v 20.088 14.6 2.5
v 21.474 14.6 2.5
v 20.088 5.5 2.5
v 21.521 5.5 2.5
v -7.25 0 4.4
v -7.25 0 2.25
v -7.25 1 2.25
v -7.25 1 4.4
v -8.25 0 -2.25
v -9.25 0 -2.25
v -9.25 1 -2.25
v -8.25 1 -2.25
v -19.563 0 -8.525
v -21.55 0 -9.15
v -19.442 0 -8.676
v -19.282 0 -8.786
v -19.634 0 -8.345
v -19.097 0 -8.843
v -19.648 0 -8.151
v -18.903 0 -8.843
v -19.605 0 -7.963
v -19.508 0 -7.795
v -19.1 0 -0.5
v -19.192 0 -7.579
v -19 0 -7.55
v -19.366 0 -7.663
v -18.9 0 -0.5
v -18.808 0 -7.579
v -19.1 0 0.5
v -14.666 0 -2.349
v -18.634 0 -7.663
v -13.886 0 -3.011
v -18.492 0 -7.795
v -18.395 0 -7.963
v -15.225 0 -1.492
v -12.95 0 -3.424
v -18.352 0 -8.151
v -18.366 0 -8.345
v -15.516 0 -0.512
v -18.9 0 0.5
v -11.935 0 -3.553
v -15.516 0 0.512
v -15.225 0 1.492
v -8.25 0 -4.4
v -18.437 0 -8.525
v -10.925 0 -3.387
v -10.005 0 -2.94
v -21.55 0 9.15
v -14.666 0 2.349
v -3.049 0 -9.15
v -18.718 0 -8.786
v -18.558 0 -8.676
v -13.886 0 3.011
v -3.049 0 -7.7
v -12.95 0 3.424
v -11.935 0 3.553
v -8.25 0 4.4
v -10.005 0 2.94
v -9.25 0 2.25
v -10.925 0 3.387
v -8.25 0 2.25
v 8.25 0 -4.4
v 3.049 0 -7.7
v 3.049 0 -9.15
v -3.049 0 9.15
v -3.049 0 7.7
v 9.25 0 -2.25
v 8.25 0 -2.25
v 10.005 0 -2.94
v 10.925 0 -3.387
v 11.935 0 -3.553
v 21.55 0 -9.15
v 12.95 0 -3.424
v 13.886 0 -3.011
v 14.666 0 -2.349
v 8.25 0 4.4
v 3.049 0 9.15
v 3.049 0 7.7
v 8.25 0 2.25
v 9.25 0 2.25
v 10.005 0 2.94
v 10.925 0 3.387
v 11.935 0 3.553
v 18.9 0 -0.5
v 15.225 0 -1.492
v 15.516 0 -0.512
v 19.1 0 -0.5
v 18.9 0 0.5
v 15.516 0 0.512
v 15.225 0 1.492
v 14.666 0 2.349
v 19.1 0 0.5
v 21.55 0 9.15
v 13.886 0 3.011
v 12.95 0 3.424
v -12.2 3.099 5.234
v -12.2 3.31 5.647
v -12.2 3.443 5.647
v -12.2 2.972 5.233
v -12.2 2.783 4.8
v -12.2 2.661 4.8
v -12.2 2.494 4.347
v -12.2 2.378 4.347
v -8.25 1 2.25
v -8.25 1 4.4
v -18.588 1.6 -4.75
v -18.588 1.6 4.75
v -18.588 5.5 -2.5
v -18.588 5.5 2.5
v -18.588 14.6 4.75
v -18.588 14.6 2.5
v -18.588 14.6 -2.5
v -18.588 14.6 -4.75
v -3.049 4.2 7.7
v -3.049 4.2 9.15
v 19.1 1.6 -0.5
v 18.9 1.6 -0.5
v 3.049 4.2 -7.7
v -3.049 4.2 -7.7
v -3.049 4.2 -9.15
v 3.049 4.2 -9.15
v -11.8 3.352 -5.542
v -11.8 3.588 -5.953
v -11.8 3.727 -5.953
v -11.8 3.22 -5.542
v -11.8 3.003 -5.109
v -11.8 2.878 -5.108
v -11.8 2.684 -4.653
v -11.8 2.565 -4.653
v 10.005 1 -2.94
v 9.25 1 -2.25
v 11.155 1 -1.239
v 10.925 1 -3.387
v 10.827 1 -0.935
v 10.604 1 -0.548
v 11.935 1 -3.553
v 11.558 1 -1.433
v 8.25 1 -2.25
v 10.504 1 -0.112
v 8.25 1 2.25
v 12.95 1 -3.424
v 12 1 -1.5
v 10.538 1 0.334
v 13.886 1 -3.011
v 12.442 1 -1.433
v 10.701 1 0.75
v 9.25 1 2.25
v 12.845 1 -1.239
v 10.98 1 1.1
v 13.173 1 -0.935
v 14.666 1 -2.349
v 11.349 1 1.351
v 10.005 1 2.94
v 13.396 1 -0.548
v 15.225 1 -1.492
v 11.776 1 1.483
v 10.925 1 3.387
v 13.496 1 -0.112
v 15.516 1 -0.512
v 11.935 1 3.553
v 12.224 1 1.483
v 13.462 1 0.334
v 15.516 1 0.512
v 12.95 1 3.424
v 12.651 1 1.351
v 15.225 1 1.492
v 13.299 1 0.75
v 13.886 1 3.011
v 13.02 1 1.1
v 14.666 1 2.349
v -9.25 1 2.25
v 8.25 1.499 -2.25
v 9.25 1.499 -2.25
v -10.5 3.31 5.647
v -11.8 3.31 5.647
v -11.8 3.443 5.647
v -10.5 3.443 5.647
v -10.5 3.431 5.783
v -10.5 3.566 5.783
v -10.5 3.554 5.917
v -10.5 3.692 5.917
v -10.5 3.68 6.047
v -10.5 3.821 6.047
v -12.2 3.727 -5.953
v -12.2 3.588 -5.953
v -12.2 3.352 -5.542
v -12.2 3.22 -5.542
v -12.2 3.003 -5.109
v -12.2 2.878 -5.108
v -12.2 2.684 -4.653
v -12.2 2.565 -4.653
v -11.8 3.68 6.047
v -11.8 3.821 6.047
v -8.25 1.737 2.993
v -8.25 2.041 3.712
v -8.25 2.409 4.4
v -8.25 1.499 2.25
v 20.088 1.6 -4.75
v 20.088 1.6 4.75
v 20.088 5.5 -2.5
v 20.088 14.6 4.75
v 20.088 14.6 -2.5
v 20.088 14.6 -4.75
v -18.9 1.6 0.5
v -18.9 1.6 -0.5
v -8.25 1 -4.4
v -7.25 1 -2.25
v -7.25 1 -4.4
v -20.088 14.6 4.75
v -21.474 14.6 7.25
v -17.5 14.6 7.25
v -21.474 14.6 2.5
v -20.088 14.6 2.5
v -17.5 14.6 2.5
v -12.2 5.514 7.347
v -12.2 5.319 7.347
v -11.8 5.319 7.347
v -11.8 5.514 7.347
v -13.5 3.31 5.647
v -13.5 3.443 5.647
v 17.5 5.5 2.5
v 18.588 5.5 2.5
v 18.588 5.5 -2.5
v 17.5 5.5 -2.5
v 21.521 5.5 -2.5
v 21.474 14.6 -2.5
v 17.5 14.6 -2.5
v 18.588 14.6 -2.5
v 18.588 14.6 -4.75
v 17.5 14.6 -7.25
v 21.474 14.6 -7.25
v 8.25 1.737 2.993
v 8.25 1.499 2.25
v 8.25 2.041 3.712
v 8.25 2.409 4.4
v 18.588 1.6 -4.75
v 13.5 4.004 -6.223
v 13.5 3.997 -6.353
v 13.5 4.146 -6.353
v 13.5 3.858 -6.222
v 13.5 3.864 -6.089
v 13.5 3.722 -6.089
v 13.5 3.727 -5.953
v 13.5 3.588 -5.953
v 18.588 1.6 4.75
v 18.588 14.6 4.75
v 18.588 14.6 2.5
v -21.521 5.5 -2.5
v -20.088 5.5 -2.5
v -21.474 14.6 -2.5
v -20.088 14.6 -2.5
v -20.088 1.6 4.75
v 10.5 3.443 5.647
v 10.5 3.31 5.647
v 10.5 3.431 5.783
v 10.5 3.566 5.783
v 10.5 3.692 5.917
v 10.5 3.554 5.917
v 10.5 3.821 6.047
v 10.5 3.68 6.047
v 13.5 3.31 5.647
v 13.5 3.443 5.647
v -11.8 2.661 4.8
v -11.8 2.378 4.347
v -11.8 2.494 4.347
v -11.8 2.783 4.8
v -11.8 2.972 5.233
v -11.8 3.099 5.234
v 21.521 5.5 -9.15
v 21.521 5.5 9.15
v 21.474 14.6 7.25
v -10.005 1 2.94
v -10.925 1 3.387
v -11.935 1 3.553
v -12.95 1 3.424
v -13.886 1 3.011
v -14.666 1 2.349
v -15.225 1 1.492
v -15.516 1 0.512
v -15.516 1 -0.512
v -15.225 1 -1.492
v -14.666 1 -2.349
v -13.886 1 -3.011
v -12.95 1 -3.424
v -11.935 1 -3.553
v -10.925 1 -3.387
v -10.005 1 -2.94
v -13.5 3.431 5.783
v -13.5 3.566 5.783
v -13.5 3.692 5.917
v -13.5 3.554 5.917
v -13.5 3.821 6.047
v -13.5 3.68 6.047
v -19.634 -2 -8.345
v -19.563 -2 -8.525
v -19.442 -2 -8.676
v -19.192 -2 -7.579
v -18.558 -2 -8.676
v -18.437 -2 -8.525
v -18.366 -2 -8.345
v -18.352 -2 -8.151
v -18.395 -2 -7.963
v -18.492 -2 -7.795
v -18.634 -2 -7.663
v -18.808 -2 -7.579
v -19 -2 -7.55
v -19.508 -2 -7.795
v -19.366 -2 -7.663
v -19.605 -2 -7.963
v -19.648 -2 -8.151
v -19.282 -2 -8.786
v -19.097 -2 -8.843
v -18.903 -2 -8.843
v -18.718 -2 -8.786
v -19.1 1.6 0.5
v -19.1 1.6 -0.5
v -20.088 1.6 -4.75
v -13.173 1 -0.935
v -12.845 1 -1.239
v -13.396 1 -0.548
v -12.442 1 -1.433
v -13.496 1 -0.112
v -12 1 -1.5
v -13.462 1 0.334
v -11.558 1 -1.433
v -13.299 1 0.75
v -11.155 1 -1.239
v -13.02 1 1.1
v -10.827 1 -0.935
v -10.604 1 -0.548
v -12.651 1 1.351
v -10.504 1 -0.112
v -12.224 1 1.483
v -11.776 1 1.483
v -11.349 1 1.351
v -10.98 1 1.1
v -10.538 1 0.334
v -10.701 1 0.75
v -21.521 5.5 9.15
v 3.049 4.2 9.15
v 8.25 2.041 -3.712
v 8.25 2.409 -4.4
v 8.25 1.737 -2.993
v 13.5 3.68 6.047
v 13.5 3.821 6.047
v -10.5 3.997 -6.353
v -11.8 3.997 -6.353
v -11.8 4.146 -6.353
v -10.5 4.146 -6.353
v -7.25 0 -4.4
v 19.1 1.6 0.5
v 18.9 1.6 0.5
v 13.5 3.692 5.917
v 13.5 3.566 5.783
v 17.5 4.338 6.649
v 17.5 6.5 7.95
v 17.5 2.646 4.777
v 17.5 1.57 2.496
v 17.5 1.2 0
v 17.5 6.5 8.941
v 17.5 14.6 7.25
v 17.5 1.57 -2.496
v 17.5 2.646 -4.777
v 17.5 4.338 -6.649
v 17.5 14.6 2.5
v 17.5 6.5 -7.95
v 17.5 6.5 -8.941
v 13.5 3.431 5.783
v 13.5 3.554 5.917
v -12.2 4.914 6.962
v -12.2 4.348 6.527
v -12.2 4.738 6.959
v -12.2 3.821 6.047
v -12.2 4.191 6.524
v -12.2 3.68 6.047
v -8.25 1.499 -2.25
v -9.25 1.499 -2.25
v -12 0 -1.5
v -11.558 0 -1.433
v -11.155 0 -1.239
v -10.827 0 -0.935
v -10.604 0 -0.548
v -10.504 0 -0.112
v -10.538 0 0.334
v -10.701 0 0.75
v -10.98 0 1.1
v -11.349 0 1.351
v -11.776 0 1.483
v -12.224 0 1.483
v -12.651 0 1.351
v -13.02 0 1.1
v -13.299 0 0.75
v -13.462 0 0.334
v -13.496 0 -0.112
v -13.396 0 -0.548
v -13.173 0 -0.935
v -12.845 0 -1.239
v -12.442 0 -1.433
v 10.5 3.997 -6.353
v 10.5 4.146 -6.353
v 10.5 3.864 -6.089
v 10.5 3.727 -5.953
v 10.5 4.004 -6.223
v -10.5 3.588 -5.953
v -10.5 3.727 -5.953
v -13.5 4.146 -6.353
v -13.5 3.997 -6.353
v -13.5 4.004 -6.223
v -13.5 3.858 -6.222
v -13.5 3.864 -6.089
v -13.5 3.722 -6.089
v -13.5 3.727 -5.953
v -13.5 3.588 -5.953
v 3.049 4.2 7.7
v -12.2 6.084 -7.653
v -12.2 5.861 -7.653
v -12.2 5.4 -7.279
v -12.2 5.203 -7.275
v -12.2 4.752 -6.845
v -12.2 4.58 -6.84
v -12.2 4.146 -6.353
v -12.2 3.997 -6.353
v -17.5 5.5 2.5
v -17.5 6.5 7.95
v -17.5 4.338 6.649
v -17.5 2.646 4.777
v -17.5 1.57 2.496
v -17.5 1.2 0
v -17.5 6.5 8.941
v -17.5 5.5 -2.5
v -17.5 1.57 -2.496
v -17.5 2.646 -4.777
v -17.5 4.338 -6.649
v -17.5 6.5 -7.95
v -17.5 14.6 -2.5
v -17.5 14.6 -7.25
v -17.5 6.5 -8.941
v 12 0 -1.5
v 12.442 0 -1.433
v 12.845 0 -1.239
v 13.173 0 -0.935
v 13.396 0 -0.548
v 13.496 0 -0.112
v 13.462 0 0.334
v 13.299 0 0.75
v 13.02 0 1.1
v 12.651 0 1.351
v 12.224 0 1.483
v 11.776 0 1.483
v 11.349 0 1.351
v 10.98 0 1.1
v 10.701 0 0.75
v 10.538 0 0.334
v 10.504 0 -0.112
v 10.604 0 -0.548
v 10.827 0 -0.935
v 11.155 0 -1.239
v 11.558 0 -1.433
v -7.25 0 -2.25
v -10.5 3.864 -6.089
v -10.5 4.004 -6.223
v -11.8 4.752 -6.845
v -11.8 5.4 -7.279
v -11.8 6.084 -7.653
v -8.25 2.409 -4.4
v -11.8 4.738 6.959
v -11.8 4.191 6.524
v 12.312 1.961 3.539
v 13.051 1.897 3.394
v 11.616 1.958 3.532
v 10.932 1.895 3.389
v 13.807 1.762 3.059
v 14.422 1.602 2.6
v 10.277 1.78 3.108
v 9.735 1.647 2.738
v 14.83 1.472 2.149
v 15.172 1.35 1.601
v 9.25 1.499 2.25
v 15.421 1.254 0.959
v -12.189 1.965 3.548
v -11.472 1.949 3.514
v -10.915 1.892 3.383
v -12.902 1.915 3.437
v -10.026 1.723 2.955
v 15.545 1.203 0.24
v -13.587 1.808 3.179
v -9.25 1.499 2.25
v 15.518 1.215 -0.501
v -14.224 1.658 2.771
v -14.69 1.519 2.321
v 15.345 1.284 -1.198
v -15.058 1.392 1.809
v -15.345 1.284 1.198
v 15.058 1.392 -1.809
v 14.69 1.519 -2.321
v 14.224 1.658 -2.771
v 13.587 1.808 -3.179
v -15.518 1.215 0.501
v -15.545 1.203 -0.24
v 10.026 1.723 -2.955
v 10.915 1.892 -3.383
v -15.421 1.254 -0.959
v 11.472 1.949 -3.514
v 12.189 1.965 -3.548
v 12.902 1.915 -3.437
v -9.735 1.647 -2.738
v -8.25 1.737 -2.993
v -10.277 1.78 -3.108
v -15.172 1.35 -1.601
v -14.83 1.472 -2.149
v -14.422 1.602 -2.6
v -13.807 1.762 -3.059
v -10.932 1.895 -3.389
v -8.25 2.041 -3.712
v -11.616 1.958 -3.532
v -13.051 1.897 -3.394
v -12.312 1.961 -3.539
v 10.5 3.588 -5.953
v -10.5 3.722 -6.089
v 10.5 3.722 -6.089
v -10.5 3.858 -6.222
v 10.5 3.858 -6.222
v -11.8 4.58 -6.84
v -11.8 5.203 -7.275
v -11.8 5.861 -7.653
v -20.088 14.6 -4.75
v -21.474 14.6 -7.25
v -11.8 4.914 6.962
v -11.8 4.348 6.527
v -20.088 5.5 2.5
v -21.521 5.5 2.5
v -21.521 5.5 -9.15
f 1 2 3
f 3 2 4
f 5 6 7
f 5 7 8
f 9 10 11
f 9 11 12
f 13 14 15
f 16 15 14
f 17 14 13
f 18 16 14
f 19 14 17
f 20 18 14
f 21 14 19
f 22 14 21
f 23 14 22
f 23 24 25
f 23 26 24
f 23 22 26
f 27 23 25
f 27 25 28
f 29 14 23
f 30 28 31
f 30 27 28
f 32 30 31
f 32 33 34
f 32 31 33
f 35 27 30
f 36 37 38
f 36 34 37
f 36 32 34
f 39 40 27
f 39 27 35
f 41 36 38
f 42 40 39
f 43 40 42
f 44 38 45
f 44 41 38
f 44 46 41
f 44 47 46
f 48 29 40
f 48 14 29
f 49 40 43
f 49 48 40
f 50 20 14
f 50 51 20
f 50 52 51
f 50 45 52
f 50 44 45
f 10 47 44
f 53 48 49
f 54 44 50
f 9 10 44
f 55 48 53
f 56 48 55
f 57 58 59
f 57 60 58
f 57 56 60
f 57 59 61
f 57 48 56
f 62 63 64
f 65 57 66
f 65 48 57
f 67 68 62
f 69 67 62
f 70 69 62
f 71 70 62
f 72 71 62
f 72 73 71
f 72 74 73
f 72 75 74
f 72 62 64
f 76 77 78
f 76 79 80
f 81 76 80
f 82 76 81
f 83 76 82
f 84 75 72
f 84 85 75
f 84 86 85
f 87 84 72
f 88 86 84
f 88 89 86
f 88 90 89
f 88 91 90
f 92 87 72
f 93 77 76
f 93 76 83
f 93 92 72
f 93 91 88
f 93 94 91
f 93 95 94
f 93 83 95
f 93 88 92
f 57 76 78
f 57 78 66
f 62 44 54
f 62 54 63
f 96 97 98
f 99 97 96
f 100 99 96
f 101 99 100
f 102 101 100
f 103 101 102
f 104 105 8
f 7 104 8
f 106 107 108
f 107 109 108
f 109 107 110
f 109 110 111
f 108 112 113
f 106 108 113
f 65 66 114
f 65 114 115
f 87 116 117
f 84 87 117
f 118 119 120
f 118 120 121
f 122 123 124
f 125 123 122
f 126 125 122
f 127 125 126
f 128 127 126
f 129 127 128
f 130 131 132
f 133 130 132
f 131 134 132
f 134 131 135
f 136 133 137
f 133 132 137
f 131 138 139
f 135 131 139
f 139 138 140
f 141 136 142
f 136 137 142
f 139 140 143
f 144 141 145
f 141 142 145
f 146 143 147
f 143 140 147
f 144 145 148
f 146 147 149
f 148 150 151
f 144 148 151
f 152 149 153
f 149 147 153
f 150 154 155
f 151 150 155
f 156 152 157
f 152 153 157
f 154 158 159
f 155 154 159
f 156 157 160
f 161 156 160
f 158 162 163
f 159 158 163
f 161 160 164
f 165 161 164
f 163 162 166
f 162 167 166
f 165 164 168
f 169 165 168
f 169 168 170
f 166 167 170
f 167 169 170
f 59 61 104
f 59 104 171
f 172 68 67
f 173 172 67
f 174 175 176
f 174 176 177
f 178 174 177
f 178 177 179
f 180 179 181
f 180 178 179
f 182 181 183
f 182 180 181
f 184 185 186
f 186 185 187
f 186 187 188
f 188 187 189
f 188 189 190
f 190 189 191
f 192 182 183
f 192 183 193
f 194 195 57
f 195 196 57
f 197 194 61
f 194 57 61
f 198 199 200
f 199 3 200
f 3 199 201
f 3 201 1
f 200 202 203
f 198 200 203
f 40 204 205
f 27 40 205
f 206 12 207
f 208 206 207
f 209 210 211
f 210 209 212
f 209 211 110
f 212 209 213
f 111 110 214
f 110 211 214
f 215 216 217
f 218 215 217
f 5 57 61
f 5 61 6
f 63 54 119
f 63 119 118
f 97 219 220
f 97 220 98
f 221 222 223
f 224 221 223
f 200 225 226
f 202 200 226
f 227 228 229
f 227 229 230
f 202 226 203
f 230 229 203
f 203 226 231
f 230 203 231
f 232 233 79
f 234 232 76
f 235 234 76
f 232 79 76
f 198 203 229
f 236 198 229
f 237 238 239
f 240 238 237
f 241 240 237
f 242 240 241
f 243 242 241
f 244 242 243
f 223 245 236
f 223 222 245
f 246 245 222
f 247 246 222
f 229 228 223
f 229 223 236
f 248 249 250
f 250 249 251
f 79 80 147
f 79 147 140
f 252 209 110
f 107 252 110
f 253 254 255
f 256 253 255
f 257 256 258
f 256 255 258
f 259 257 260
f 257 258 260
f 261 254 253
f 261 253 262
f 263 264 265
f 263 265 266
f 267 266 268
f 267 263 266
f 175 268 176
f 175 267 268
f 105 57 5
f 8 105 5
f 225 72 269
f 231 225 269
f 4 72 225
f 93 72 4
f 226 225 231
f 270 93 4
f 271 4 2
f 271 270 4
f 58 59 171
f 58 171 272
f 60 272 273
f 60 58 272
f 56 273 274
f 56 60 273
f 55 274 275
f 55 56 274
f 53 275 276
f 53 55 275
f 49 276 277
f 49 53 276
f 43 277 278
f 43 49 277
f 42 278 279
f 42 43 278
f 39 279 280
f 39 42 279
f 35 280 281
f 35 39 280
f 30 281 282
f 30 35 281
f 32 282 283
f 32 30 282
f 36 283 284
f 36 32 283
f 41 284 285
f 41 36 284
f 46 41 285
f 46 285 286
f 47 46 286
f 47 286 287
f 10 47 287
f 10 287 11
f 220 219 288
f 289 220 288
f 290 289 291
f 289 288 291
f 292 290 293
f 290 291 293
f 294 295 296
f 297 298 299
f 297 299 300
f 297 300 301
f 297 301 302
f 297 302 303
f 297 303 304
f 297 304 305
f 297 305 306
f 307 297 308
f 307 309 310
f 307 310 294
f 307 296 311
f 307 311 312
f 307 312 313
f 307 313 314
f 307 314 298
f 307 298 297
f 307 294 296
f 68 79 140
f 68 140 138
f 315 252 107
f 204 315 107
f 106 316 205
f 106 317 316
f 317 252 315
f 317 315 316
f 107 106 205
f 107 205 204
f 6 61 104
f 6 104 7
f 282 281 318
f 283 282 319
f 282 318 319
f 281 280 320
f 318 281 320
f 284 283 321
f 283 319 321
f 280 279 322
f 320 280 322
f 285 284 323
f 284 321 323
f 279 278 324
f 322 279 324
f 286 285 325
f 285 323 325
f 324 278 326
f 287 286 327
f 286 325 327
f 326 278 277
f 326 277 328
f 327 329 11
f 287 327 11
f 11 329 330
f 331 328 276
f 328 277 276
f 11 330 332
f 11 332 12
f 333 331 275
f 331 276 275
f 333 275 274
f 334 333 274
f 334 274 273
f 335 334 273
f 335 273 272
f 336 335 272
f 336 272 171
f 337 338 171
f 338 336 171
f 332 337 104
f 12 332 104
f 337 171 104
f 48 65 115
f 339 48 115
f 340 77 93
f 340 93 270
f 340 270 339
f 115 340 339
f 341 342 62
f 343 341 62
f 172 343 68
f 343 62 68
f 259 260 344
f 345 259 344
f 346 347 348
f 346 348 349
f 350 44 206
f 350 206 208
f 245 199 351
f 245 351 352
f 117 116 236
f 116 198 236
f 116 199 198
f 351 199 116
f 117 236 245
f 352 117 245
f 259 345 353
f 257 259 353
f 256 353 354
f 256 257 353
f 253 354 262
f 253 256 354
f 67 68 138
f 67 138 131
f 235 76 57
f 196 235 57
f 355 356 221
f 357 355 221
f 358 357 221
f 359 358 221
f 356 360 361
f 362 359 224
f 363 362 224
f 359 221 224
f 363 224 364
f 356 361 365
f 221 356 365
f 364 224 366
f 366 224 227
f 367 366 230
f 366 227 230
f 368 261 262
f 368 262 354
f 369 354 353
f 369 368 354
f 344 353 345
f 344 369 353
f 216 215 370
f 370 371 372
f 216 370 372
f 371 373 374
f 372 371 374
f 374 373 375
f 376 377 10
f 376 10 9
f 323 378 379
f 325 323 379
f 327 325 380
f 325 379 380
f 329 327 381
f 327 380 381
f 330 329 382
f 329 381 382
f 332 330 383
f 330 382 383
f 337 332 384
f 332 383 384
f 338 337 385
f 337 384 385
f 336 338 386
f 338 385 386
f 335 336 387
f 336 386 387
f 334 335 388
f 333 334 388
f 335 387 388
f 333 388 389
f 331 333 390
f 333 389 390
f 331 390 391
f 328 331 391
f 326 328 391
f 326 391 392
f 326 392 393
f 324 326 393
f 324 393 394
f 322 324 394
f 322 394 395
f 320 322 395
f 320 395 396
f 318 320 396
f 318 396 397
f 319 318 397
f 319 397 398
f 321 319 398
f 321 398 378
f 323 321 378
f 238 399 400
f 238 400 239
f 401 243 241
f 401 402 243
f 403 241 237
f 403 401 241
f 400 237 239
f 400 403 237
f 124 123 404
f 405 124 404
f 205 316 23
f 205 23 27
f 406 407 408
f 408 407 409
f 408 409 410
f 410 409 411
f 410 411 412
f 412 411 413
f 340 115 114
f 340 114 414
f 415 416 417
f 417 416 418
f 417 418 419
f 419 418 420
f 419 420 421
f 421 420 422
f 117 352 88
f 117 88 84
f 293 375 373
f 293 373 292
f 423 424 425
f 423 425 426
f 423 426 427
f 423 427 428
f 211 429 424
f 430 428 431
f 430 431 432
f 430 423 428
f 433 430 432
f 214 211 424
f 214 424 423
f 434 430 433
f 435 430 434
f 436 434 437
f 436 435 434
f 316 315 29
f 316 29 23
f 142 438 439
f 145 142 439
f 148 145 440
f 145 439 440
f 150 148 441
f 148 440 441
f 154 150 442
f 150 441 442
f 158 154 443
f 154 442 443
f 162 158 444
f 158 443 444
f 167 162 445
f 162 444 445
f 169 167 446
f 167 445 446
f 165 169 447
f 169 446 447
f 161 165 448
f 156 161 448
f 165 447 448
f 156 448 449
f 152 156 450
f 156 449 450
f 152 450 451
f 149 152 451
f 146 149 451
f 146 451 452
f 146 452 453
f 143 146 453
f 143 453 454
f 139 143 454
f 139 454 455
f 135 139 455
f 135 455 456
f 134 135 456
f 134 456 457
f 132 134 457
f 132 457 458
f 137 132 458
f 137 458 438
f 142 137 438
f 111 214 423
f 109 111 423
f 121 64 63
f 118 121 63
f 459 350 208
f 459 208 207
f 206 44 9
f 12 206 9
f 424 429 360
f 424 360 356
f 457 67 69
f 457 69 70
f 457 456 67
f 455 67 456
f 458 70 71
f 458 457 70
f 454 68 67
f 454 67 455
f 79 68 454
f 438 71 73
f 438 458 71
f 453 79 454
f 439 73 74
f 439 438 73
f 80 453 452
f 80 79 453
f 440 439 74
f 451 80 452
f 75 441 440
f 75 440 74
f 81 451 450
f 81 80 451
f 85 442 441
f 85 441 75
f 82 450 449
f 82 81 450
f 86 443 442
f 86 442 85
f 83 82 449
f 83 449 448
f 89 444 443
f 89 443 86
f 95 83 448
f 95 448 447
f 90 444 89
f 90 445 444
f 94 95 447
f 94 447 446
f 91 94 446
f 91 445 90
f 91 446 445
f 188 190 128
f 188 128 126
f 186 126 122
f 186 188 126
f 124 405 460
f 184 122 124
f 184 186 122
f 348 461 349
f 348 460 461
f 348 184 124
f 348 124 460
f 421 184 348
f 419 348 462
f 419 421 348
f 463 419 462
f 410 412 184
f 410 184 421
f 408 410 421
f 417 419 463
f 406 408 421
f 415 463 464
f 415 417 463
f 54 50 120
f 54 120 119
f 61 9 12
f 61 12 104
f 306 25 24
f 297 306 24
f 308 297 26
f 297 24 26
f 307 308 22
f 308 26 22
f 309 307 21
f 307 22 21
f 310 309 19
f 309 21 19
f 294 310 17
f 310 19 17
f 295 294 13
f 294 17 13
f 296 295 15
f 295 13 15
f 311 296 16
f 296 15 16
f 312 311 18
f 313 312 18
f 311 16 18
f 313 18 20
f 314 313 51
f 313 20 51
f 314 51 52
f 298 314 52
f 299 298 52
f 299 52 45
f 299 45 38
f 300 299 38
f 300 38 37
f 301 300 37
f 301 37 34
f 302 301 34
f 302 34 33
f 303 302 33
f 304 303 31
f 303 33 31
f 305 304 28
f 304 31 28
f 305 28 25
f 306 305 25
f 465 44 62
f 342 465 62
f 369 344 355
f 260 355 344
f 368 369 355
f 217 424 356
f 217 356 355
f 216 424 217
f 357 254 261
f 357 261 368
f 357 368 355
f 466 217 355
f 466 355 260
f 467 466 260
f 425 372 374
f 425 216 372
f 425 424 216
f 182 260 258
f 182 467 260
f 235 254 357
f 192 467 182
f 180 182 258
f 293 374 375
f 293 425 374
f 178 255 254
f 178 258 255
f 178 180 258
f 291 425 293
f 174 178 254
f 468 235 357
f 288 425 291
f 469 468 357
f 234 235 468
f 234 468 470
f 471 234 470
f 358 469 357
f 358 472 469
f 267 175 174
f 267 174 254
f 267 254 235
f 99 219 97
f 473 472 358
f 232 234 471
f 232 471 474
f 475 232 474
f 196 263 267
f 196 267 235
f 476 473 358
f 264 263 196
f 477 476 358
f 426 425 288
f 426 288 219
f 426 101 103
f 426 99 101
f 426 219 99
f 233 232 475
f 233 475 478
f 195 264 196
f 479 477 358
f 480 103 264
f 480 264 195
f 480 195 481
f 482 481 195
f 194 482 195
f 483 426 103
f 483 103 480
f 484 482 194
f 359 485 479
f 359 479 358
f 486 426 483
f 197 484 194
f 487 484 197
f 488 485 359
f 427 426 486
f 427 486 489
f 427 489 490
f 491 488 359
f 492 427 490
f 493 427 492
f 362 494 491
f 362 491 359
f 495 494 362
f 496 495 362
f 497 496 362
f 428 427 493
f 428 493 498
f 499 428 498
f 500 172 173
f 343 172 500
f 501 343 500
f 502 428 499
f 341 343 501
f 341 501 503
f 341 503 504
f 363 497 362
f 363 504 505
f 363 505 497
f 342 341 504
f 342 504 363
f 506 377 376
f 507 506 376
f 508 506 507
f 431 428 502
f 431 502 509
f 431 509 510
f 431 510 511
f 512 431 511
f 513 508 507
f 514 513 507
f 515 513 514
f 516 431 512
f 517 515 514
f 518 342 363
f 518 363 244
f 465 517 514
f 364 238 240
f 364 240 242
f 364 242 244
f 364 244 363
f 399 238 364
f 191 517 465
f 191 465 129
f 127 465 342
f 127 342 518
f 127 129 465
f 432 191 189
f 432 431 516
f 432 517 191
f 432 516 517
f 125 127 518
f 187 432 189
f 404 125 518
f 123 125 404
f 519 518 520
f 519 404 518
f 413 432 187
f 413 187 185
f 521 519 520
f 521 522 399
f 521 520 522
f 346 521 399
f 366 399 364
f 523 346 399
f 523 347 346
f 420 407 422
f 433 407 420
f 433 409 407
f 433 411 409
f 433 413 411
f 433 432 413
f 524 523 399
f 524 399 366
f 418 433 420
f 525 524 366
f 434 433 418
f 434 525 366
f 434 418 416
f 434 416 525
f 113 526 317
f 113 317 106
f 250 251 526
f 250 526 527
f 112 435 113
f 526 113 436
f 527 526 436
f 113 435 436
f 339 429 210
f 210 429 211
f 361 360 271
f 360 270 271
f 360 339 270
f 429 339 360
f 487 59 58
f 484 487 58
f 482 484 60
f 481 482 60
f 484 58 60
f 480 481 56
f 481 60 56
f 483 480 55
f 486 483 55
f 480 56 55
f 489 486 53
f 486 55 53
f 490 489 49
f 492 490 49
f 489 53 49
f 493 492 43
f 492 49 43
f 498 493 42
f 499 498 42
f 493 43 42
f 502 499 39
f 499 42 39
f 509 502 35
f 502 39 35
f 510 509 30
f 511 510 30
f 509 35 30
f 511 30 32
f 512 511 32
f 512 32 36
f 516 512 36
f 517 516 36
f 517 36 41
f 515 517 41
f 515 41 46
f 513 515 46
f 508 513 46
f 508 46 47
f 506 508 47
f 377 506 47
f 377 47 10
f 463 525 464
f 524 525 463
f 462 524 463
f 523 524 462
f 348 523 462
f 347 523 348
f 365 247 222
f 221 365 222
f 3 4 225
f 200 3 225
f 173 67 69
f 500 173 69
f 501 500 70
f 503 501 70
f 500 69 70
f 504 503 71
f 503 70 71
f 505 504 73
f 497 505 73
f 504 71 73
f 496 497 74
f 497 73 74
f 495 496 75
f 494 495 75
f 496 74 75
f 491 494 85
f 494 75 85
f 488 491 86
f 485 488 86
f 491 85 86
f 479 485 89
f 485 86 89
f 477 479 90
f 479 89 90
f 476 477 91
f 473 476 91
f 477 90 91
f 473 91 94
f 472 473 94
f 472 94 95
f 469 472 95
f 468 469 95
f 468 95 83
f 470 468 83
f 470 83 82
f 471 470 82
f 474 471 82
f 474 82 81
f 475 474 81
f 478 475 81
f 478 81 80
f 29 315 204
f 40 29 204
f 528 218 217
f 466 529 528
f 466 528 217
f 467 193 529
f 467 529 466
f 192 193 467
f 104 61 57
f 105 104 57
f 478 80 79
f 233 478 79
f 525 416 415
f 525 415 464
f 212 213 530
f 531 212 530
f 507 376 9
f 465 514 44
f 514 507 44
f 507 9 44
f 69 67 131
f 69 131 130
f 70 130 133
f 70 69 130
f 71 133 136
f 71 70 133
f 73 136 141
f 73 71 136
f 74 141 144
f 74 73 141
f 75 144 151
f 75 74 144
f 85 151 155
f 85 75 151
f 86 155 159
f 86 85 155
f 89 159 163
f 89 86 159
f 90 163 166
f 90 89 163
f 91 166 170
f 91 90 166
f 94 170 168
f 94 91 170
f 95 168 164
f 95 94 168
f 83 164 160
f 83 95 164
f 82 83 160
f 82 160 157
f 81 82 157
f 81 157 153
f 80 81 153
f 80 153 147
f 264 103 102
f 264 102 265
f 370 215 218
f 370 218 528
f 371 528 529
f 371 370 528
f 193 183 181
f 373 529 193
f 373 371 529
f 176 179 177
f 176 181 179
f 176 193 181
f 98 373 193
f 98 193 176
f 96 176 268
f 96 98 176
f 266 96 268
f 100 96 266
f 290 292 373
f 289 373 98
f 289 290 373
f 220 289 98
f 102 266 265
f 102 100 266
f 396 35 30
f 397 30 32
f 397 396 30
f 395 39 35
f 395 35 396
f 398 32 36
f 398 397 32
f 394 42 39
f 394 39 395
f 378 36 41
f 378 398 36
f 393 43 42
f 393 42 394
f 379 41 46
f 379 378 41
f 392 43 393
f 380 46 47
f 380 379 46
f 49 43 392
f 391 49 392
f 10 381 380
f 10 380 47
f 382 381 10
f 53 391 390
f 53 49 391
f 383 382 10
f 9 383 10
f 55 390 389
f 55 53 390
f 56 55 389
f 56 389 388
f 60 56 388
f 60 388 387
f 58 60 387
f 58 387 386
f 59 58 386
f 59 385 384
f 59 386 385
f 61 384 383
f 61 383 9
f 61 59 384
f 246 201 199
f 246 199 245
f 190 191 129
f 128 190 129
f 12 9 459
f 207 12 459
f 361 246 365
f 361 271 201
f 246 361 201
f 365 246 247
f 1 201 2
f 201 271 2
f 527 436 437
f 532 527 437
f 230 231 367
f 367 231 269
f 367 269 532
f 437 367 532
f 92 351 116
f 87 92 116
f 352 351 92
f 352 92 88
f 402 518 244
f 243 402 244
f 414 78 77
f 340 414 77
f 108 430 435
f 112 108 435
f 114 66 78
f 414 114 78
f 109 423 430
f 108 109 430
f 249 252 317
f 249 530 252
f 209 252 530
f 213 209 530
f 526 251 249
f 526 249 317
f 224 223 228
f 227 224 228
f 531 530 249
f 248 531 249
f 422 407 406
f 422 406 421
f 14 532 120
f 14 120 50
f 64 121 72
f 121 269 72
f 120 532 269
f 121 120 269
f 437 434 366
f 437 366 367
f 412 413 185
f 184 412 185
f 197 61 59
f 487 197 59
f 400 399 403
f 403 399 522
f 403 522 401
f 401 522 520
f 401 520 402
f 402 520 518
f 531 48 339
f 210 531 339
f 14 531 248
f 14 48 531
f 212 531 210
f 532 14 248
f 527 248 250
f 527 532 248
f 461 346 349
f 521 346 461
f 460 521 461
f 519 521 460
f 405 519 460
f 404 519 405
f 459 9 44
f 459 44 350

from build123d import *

# Parameters (mm, degrees)
EXTRUDE1_DEPTH          = 21.55
EXTRUDE10_DEPTH         = 12.7
CUT_EXTRUDE2_DEPTH      = 17.5
CUT_EXTRUDE2_DEPTH_BACK = 17.5
CUT_EXTRUDE3_DEPTH      = 17.5
SKETCH16_W              = 6.097167606
SKETCH16_H              = 1.45
CUT_EXTRUDE4_DEPTH      = 4.2
SKETCH17_R              = 0.65
BOSS_EXTRUDE1_DEPTH     = 2
CUT_EXTRUDE6_DEPTH      = 28.591393586
BOSS_EXTRUDE2_DEPTH     = 1
SKETCH20_W              = 1
SKETCH20_H              = 2.15
BOSS_EXTRUDE2_2_DEPTH   = 1
BOSS_EXTRUDE2_3_DEPTH   = 1
BOSS_EXTRUDE2_4_DEPTH   = 1
SKETCH22_R              = 1.5
CUT_EXTRUDE7_DEPTH      = 28.591393586
SKETCH23_W              = 1.3
SKETCH23_H              = 0.4
SKETCH23_W_2            = 0.4
SKETCH23_H_2            = 1.3
SKETCH23_W_3            = 3
BOSS_EXTRUDE3_DEPTH     = 14.6
CUT_EXTRUDE8_START      = 4
SKETCH24_R              = 8.5125
CUT_EXTRUDE8_DEPTH      = 27
SKETCH25_W              = 1.5
SKETCH25_H              = 9.5
CUT_EXTRUDE9_DEPTH      = 13
SKETCH26_W              = 0.2
SKETCH26_H              = 1
CUT_EXTRUDE10_DEPTH     = 1.6


with BuildPart() as part:
    # Sketch1 → Extrude1 (new, symmetric)
    with BuildSketch(Plane(origin=(0, 0, 0), x_dir=(0, 0, -1), z_dir=(1, 0, 0))):
        Polygon((-9.15, 5.5), (-7.25, 14.6), (-2.5, 14.6), (-2.5, 5.5), (2.5, 5.5), (2.5, 14.6), (7.25, 14.6), (9.15, 5.5), (9.15, 0), (-9.15, 0), align=None)
    extrude(amount=EXTRUDE1_DEPTH, both=True)

    # Sketch11 → Extrude10 (cut, symmetric)
    with BuildSketch(Plane.XY):
        Polygon((-21.55, 14.6), (-21.55, 0), (-21.47355388, 14.6), align=None)
        Polygon((21.47355388, 14.6), (21.55, 14.6), (21.55, 0), align=None)
    extrude(amount=EXTRUDE10_DEPTH, both=True, mode=Mode.SUBTRACT)

    # Sketch14 → Cut-Extrude2 (cut, two sides: drawn at the far end of the back side and taken through both)
    with BuildSketch(Plane(origin=(0, 0, 0), x_dir=(0, 0, -1), z_dir=(1, 0, 0)).offset(-CUT_EXTRUDE2_DEPTH_BACK)):
        with BuildLine():
            Line((-9.25, 6.5), (-7.95, 6.5))
            ThreePointArc((-7.95, 6.5), (0, 1.2), (7.95, 6.5))
            Line((7.95, 6.5), (9.25, 6.5))
            Line((9.25, 6.5), (9.25, 17.665807692))
            Line((9.25, 17.665807692), (-9.25, 17.665807692))
            Line((-9.25, 17.665807692), (-9.25, 6.5))
        make_face()
    extrude(amount=CUT_EXTRUDE2_DEPTH + CUT_EXTRUDE2_DEPTH_BACK, mode=Mode.SUBTRACT)

    # Sketch15 → Cut-Extrude3 (cut)
    with BuildSketch(Plane.XZ):
        Polygon((-9.25, 2), (-9.25, -2), (-8.25, -2), (-8.25, -4.4), (8.25, -4.4), (8.25, 4.4), (-8.25, 4.4), (-8.25, 2), align=None)
    extrude(amount=-CUT_EXTRUDE3_DEPTH, mode=Mode.SUBTRACT)

    # Sketch16 → Cut-Extrude4 (cut)
    with BuildSketch(Plane.XZ):
        with Locations((0, 8.425)):
            Rectangle(SKETCH16_W, SKETCH16_H)
        with Locations((0, -8.425)):
            Rectangle(SKETCH16_W, SKETCH16_H)
    extrude(amount=-CUT_EXTRUDE4_DEPTH, mode=Mode.SUBTRACT)

    # Sketch17 → Boss-Extrude1 (add)
    with BuildSketch(Plane.XZ):
        with Locations(Location((-19, -8.2, 0), (0, 0, 90))):
            Circle(SKETCH17_R)
    extrude(amount=BOSS_EXTRUDE1_DEPTH)

    # Sketch18 → Cut-Extrude6 (cut, through all)
    with BuildSketch(Plane.XZ):
        with BuildLine():
            Line((8.25, 2.25), (8.25, -2.25))
            Line((8.25, -2.25), (9.25, -2.25))
            ThreePointArc((9.25, -2.25), (15.553167601, 0), (9.25, 2.25))
            Line((9.25, 2.25), (8.25, 2.25))
        make_face()
        with BuildLine():
            Line((-9.25, -2.25), (-8.25, -2.25))
            Line((-8.25, -2.25), (-8.25, -2))
            Line((-8.25, -2), (-9.25, -2))
            Line((-9.25, -2), (-9.25, 2))
            Line((-9.25, 2), (-8.25, 2))
            Line((-8.25, 2), (-8.25, 2.25))
            Line((-8.25, 2.25), (-9.25, 2.25))
            ThreePointArc((-9.25, 2.25), (-15.553167601, 0), (-9.25, -2.25))
        make_face()
    extrude(amount=-CUT_EXTRUDE6_DEPTH, mode=Mode.SUBTRACT)

    # Sketch23 → Boss-Extrude3 (add, through all)
    with BuildSketch(Plane.XZ):
        with Locations((-11.15, -6.152737687)):
            Rectangle(SKETCH23_W, SKETCH23_H)
        with Locations((-12.85, -6.152737687)):
            Rectangle(SKETCH23_W, SKETCH23_H)
        with Locations((-12, -5.302737687)):
            Rectangle(SKETCH23_W_2, SKETCH23_H_2)
        with Locations((-12, -6.152737687)):
            Rectangle(SKETCH23_W_2, SKETCH23_H)
        with Locations((-12, -7.002737687)):
            Rectangle(SKETCH23_W_2, SKETCH23_H_2)
        with Locations((-12, 4.997262313)):
            Rectangle(SKETCH23_W_2, SKETCH23_H_2)
        with Locations((-12, 5.847262313)):
            Rectangle(SKETCH23_W_2, SKETCH23_H)
        with Locations((-11.15, 5.847262313)):
            Rectangle(SKETCH23_W, SKETCH23_H)
        with Locations((-12.85, 5.847262313)):
            Rectangle(SKETCH23_W, SKETCH23_H)
        with Locations((-12, 6.697262313)):
            Rectangle(SKETCH23_W_2, SKETCH23_H_2)
        with Locations((12, 5.847262313)):
            Rectangle(SKETCH23_W_3, SKETCH23_H)
        with Locations((12, -6.152737687)):
            Rectangle(SKETCH23_W_3, SKETCH23_H)
    extrude(amount=-BOSS_EXTRUDE3_DEPTH)

    # Sketch24 → Cut-Extrude8 (cut)
    with BuildSketch(Plane(origin=(-17.5, 0, 0), x_dir=(0, 0, -1), z_dir=(1, 0, 0)).offset(CUT_EXTRUDE8_START)):
        with Locations((0, 9.8125)):
            Circle(SKETCH24_R)
    extrude(amount=CUT_EXTRUDE8_DEPTH, mode=Mode.SUBTRACT)


with BuildPart() as body_2:
    # Sketch20 → Boss-Extrude2 (new body)
    with BuildSketch(Plane.XZ):
        with BuildLine():
            Line((-8.25, 2.25), (-9.25, 2.25))
            ThreePointArc((-9.25, 2.25), (-15.553167601, 0), (-9.25, -2.25))
            Line((-9.25, -2.25), (-8.25, -2.25))
            Line((-8.25, -2.25), (-8.25, 2.25))
        make_face()
    extrude(amount=-BOSS_EXTRUDE2_DEPTH)


with BuildPart() as body_3:
    # Sketch20 → Boss-Extrude2 2 (new body)
    with BuildSketch(Plane.XZ):
        with Locations((-7.75, 3.325)):
            Rectangle(SKETCH20_W, SKETCH20_H)
    extrude(amount=-BOSS_EXTRUDE2_2_DEPTH)


with BuildPart() as body_4:
    # Sketch20 → Boss-Extrude2 3 (new body)
    with BuildSketch(Plane.XZ):
        with Locations((-7.75, -3.325)):
            Rectangle(SKETCH20_W, SKETCH20_H)
    extrude(amount=-BOSS_EXTRUDE2_3_DEPTH)


with BuildPart() as body_5:
    # Sketch20 → Boss-Extrude2 4 (new body)
    with BuildSketch(Plane.XZ):
        with BuildLine():
            Line((9.25, 2.25), (8.25, 2.25))
            Line((8.25, 2.25), (8.25, -2.25))
            Line((8.25, -2.25), (9.25, -2.25))
            ThreePointArc((9.25, -2.25), (15.553167601, 0), (9.25, 2.25))
        make_face()
    extrude(amount=-BOSS_EXTRUDE2_4_DEPTH)


with BuildPart() as cut_extrude7_tool:
    # Sketch22 → Cut-Extrude7 (new, through all)
    with BuildSketch(Plane.XZ):
        with Locations(Location((-12, 0, 0), (0, 0, 270))):
            Circle(SKETCH22_R)
        with Locations(Location((12, 0, 0), (0, 0, 270))):
            Circle(SKETCH22_R)
    extrude(amount=-CUT_EXTRUDE7_DEPTH)


with BuildPart() as body_2_1:
    add(body_2.part)

    # Cut-Extrude7: cut by cut_extrude7_tool
    add(cut_extrude7_tool.part, mode=Mode.SUBTRACT)


with BuildPart() as body_5_1:
    add(body_5.part)

    # Cut-Extrude7: cut by cut_extrude7_tool
    add(cut_extrude7_tool.part, mode=Mode.SUBTRACT)


with BuildPart() as cut_extrude8_kept_piece:
    # of the separate pieces the step leaves, the one the design keeps (cut_extrude8_pieces_kept)
    add(part.part.solids().sort_by_distance((-21.521201804, 5.5, 9.15))[0])

    # Sketch25 → Cut-Extrude9 (cut)
    with BuildSketch(Plane(origin=(0, 14.6, 0), x_dir=(1, 0, 0), z_dir=(0, 1, 0))):
        with Locations((-19.338085679, 0)):
            Rectangle(SKETCH25_W, SKETCH25_H)
    cut_extrude9 = extrude(amount=-CUT_EXTRUDE9_DEPTH, mode=Mode.SUBTRACT)

    # Sketch26 → Cut-Extrude10 (cut)
    with BuildSketch(Plane(origin=(0, 1.6, 0), x_dir=(1, 0, 0), z_dir=(0, 1, 0))):
        with Locations((-19, 0)):
            Rectangle(SKETCH26_W, SKETCH26_H)
    cut_extrude10 = extrude(amount=-CUT_EXTRUDE10_DEPTH, mode=Mode.SUBTRACT)

    # Mirror1: Cut-Extrude9, Cut-Extrude10 across plane
    add(cut_extrude9.mirror(Plane(origin=(0, 0, 0), x_dir=(0, 0, 1), z_dir=(1, 0, 0))), mode=Mode.SUBTRACT)
    add(cut_extrude10.mirror(Plane(origin=(0, 0, 0), x_dir=(0, 0, 1), z_dir=(1, 0, 0))), mode=Mode.SUBTRACT)


solid = Compound([body_3.part, body_4.part, body_2_1.part, body_5_1.part, cut_extrude8_kept_piece.part])
